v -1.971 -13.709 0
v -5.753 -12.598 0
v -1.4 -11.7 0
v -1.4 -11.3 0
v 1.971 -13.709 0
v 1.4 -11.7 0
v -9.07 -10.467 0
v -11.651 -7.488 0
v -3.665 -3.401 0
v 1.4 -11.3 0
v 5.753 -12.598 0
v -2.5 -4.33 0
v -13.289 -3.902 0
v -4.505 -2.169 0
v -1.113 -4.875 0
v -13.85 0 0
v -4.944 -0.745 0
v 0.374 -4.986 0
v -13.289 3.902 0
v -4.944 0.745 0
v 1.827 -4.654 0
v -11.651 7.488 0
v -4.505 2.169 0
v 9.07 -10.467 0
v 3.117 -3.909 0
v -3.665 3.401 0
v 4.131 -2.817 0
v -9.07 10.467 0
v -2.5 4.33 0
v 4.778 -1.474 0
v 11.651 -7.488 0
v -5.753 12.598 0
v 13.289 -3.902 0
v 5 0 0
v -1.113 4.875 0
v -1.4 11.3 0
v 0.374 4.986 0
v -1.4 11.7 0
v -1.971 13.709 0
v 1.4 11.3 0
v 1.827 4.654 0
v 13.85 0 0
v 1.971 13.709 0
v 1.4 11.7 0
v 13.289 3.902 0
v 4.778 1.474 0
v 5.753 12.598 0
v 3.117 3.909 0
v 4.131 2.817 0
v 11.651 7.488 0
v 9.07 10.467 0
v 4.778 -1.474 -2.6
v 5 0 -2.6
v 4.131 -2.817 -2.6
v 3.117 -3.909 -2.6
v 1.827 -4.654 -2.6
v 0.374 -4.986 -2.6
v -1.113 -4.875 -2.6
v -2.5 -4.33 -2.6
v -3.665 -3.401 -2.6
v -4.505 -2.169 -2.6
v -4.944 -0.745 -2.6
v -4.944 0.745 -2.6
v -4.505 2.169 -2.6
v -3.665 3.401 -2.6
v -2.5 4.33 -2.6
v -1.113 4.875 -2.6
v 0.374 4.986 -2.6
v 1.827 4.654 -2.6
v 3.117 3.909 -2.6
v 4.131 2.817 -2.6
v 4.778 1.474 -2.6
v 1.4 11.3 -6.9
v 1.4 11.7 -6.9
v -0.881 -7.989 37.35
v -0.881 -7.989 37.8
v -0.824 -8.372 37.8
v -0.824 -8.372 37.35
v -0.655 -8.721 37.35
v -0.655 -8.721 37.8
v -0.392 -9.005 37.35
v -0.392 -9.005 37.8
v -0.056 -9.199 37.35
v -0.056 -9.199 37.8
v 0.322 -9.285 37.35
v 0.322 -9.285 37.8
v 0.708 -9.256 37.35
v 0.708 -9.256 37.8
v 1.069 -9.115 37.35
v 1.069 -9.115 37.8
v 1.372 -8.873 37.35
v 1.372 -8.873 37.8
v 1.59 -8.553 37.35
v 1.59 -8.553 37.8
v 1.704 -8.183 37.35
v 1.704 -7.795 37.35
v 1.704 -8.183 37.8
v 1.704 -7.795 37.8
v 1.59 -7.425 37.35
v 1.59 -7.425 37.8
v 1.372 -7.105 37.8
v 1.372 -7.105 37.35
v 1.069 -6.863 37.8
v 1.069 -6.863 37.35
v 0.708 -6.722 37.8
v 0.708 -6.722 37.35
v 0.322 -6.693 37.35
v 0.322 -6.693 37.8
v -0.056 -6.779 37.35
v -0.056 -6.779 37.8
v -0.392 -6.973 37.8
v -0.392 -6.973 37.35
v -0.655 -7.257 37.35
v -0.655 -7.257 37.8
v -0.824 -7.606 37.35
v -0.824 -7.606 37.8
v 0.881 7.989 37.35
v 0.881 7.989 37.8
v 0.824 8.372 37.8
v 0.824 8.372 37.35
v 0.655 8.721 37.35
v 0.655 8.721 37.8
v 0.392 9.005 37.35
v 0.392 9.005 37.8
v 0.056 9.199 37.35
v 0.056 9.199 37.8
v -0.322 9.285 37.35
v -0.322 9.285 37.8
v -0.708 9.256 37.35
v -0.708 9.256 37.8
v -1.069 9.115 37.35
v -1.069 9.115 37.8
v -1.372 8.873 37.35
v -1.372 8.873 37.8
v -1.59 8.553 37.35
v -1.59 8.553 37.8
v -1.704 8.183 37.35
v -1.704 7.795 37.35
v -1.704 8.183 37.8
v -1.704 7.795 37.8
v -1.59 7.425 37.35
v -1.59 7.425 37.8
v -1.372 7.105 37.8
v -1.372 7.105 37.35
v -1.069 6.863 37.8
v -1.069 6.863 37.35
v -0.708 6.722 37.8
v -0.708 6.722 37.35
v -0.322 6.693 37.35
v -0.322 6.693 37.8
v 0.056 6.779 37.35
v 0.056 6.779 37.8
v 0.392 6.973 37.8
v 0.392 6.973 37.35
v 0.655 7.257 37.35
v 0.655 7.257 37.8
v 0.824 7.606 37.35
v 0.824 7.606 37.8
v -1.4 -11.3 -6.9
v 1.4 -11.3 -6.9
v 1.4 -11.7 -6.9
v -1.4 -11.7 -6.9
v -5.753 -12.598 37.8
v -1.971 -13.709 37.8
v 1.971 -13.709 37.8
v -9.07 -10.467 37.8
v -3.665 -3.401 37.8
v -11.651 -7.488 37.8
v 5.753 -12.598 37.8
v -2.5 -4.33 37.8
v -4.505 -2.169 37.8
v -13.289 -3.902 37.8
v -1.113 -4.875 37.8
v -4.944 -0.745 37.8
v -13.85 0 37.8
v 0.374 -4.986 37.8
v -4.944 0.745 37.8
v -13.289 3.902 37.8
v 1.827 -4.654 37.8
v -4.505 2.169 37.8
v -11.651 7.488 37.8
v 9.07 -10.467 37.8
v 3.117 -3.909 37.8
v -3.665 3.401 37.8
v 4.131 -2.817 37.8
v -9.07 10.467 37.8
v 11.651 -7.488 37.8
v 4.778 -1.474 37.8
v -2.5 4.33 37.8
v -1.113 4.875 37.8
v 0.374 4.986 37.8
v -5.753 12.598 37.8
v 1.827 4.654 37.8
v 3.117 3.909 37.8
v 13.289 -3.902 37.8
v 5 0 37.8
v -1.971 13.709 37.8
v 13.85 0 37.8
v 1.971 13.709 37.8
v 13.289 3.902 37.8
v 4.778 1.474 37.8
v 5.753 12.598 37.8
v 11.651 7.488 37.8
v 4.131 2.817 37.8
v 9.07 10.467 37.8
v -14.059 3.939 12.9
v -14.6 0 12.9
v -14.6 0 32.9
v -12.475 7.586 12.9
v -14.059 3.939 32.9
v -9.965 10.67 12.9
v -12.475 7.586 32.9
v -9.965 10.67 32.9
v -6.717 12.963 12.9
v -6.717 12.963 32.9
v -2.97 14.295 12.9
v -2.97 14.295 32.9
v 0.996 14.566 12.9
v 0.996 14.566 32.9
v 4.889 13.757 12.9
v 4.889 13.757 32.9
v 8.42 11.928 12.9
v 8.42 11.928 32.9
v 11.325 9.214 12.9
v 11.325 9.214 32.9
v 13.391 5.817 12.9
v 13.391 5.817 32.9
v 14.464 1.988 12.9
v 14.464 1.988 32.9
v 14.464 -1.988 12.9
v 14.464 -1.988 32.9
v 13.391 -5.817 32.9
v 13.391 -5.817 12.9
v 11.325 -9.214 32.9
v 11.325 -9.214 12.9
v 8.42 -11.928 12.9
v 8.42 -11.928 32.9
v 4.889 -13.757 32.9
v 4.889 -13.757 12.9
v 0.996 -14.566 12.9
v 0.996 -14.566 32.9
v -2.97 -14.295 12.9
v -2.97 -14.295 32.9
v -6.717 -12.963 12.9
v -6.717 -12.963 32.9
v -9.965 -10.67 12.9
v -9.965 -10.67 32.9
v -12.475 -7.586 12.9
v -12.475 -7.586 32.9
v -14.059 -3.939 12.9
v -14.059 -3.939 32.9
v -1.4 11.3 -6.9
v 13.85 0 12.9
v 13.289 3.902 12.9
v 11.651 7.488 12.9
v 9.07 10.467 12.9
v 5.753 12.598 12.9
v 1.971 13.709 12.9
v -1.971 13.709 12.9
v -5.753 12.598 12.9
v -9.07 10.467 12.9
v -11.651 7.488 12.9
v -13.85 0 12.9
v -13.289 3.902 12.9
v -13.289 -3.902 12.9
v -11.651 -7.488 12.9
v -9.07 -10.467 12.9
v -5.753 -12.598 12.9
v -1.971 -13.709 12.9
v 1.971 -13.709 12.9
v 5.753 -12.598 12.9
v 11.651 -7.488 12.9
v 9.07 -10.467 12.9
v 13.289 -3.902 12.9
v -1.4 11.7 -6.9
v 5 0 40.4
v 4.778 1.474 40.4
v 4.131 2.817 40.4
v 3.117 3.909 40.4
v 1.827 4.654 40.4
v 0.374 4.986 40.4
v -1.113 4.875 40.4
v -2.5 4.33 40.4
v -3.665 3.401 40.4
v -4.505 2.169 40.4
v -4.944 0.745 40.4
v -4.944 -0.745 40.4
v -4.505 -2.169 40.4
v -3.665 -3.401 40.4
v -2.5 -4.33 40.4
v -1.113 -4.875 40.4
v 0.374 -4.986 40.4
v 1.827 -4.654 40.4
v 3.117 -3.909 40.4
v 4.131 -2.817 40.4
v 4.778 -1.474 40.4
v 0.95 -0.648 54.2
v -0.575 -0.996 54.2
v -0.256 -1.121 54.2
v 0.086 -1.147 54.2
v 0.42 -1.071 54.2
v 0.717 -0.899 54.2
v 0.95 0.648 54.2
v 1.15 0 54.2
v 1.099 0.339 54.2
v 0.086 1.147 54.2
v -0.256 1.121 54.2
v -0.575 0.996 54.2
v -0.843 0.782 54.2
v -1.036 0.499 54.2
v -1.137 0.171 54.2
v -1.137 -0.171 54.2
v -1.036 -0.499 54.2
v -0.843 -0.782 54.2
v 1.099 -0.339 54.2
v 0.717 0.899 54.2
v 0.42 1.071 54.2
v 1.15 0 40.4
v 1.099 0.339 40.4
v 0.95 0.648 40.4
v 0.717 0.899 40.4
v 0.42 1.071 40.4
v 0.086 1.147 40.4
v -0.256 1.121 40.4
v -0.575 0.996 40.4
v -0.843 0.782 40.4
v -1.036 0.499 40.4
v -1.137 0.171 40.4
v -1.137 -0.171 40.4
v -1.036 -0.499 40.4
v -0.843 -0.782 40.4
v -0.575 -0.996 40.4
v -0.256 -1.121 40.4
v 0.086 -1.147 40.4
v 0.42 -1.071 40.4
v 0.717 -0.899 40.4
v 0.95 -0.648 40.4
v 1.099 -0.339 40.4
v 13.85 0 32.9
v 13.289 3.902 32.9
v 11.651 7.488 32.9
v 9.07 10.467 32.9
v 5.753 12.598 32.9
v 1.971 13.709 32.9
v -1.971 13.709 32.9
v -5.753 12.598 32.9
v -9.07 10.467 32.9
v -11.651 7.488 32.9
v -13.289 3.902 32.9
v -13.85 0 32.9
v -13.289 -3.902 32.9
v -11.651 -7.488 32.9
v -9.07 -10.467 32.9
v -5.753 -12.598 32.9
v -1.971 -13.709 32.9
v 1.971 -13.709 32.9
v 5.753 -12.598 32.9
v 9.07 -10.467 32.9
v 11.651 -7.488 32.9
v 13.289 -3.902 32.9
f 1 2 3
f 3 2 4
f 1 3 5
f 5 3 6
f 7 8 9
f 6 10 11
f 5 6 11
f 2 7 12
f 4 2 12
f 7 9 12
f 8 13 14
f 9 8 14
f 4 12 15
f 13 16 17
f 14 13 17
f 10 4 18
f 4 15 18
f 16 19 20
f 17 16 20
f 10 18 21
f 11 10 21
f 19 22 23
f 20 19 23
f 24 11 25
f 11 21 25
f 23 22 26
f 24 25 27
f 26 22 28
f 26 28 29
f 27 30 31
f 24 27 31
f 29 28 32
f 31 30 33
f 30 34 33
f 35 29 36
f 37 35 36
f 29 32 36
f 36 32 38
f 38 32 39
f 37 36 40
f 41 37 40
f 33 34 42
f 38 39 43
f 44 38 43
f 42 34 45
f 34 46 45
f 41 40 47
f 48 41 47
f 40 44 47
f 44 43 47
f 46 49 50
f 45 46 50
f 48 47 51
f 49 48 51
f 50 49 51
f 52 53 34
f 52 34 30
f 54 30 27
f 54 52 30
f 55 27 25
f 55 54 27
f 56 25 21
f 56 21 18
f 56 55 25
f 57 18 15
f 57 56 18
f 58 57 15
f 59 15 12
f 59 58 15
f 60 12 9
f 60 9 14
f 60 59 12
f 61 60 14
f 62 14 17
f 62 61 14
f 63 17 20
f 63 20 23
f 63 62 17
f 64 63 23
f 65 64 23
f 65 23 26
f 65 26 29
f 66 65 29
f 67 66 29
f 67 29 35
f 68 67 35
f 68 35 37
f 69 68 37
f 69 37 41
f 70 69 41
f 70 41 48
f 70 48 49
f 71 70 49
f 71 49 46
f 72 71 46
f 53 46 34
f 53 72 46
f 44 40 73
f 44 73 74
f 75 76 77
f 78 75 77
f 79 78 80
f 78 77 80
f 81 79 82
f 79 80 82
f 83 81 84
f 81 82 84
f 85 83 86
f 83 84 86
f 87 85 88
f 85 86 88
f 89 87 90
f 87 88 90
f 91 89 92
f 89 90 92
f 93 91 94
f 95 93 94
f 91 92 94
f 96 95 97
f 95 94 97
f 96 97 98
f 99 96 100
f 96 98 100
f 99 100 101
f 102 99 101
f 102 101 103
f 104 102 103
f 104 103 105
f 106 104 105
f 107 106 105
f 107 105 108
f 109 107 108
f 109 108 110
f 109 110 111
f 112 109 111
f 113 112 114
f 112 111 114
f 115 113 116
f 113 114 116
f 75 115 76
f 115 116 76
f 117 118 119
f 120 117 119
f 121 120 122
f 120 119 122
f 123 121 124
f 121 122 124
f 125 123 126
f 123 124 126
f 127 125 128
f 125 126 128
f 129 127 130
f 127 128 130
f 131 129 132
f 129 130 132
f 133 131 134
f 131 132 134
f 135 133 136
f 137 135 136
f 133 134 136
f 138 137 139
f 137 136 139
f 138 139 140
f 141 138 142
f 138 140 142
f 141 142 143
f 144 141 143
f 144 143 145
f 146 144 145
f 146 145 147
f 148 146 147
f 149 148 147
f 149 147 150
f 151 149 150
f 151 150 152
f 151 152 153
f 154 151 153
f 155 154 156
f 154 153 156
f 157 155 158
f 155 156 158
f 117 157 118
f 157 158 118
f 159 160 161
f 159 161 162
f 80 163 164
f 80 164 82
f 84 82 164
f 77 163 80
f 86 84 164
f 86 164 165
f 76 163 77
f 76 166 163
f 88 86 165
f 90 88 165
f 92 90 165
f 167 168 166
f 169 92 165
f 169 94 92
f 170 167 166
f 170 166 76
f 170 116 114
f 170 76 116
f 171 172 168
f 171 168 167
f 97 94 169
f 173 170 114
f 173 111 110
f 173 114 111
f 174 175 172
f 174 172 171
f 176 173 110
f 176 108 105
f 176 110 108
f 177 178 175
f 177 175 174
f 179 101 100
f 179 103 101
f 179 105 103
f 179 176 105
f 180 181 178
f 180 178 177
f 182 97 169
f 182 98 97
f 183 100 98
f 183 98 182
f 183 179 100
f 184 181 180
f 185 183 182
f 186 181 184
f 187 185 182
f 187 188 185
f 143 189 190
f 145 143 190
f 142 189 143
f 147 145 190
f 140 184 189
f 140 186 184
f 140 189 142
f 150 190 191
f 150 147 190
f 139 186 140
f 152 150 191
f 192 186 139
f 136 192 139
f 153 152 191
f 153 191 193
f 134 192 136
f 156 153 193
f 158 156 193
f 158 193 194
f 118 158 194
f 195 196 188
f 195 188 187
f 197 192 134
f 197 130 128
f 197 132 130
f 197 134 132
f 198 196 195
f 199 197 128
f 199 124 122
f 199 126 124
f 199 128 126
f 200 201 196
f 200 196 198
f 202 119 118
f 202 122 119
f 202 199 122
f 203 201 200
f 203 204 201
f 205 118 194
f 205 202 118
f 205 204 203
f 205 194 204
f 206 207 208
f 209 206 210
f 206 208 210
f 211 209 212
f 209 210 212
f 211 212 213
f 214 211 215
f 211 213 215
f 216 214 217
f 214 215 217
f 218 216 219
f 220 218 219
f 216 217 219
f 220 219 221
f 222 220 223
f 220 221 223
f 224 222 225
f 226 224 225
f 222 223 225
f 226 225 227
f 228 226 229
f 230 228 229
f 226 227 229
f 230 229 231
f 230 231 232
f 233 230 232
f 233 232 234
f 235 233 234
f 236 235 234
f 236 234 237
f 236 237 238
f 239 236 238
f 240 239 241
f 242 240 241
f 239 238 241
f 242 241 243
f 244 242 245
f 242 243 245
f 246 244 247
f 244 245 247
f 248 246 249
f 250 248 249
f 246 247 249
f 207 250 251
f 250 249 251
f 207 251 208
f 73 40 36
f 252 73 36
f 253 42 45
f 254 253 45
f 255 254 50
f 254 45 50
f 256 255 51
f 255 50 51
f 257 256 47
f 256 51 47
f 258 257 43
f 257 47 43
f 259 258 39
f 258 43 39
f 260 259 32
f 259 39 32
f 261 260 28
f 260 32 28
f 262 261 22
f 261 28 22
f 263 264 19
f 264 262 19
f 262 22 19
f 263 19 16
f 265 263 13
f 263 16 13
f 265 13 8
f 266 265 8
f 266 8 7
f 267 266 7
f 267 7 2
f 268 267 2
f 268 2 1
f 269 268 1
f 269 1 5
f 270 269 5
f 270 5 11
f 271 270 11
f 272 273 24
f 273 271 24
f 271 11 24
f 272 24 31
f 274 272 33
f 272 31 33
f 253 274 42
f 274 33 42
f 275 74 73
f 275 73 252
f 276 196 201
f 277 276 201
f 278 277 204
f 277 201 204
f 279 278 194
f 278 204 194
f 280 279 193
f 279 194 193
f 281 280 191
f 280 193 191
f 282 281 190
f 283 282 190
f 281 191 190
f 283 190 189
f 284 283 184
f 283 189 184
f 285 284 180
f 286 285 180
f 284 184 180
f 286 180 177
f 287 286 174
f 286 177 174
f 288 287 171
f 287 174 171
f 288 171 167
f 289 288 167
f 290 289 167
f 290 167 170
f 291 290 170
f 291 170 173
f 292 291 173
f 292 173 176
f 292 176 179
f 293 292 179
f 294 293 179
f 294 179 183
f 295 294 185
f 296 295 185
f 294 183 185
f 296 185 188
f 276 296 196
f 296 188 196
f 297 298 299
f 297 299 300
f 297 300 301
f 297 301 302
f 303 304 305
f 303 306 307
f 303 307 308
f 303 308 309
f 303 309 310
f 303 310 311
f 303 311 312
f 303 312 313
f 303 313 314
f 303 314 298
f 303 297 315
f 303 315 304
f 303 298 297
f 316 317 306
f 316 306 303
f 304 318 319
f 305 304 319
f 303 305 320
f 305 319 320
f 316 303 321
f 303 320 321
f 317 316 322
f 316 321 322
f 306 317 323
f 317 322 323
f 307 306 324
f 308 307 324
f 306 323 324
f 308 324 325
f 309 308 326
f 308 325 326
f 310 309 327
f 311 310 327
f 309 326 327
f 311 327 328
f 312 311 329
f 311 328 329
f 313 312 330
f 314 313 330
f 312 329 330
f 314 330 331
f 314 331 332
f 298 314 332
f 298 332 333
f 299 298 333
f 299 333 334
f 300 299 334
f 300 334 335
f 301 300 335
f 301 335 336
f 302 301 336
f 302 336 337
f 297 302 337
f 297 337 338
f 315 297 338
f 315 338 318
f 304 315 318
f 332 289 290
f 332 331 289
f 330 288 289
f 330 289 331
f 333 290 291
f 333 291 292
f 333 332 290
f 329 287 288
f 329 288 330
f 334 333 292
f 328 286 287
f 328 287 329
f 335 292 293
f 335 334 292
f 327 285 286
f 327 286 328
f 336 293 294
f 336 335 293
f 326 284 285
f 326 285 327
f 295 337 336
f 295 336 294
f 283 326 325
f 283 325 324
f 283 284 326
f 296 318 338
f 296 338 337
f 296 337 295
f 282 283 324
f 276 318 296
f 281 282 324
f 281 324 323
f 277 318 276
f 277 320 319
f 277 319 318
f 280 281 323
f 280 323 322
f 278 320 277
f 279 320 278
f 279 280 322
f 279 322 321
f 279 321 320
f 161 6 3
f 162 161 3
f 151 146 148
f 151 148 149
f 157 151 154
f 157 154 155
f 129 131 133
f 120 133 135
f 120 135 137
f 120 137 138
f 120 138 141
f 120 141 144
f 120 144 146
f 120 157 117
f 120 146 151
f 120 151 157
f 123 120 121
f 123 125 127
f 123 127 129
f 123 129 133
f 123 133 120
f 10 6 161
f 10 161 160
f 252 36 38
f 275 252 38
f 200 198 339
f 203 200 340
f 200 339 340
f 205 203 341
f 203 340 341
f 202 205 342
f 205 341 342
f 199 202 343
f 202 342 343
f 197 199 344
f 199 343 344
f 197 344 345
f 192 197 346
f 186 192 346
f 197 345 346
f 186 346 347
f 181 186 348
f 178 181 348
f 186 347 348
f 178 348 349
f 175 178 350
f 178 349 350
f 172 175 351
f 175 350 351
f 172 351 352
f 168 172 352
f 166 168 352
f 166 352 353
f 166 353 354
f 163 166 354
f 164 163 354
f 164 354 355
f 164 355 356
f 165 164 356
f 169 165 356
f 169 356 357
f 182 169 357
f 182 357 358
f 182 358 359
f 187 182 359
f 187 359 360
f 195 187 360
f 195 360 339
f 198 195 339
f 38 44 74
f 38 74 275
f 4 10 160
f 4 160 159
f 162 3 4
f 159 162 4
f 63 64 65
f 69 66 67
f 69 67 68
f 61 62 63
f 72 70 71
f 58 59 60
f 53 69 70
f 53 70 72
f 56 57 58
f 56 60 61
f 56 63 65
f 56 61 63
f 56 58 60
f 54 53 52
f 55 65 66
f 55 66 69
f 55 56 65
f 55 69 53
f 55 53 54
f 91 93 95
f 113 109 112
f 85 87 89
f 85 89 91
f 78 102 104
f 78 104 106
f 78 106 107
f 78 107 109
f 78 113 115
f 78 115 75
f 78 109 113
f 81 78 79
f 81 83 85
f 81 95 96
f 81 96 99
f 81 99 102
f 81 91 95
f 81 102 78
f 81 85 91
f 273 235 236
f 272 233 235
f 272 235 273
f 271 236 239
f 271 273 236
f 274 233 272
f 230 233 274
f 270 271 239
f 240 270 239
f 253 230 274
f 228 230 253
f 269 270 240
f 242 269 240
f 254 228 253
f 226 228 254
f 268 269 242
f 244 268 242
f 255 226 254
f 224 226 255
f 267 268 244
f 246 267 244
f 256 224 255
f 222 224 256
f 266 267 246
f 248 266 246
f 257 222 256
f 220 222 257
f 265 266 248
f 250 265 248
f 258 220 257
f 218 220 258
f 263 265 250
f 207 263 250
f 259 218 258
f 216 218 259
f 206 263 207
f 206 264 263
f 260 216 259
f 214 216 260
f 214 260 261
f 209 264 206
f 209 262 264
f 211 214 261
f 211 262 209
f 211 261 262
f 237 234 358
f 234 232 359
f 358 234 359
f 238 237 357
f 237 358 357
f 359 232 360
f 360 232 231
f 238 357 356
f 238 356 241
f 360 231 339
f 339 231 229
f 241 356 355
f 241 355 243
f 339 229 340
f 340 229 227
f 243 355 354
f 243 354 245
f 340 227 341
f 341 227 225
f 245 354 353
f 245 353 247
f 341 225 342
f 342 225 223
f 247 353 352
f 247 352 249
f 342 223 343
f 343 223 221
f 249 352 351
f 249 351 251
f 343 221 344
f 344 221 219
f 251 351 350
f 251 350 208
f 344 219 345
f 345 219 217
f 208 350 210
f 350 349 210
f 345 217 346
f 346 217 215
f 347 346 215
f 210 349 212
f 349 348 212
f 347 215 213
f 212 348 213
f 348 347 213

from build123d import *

# Parameters (mm, degrees)
SKETCH_1_R          = 13.85
EXTRUDE_1_DEPTH     = 37.8
SKETCH_2_R          = 5
EXTRUDE_2_DEPTH     = 2.6
EXTRUDE_START       = -2.6
SKETCH_3_R          = 1.15
EXTRUDE_3_DEPTH     = 16.4
EXTRUDE_START_2     = -32.9
SKETCH_4_R          = 14.6
EXTRUDE_4_DEPTH     = 20
EXTRUDE_START_3     = 2.6
SKETCH_5_R          = 5
EXTRUDE_5_DEPTH     = 2.6
SKETCH_6_W          = 2.8
SKETCH_6_H          = 0.4
EXTRUDE_6_DEPTH     = 6.9
SKETCH_7_R          = 1.3
CUT_EXTRUDE_1_DEPTH = 0.45


with BuildPart() as part:
    # ｽｹｯﾁ1 → ﾎﾞｽ - 押し出し1 (new body)
    with BuildSketch(Plane.XY):
        Circle(SKETCH_1_R)
    extrude(amount=EXTRUDE_1_DEPTH)

    # ｽｹｯﾁ2 → ﾎﾞｽ - 押し出し2 (add)
    with BuildSketch(Plane.XY.offset(37.8)):
        Circle(SKETCH_2_R)
    extrude(amount=EXTRUDE_2_DEPTH)

    # ｽｹｯﾁ3 → ﾎﾞｽ - 押し出し3 (add)
    with BuildSketch(Plane.XY.offset(40.4).offset(EXTRUDE_START)):
        Circle(SKETCH_3_R)
    extrude(amount=EXTRUDE_3_DEPTH)

    # ｽｹｯﾁ4 → ﾎﾞｽ - 押し出し4 (add)
    with BuildSketch(Plane(origin=(0, 0, 0), x_dir=(-1, 0, 0), z_dir=(0, 0, -1)).offset(EXTRUDE_START_2)):
        Circle(SKETCH_4_R)
    extrude(amount=EXTRUDE_4_DEPTH)

    # ｽｹｯﾁ5 → ﾎﾞｽ - 押し出し5 (add)
    with BuildSketch(Plane(origin=(0, 0, 0), x_dir=(-1, 0, 0), z_dir=(0, 0, -1)).offset(EXTRUDE_START_3)):
        with Locations(Location((0, 0, 0), (0, 0, 180))):
            Circle(SKETCH_5_R)
    extrude(amount=-EXTRUDE_5_DEPTH)

    # ｽｹｯﾁ6 → ﾎﾞｽ - 押し出し6 (add)
    with BuildSketch(Plane(origin=(0, 0, 0), x_dir=(-1, 0, 0), z_dir=(0, 0, -1))):
        with Locations((0, 11.5)):
            Rectangle(SKETCH_6_W, SKETCH_6_H)
        with Locations((0, -11.5)):
            Rectangle(SKETCH_6_W, SKETCH_6_H)
    extrude(amount=EXTRUDE_6_DEPTH)

    # ｽｹｯﾁ7 → ｶｯﾄ - 押し出し1 (cut)
    with BuildSketch(Plane.XY.offset(37.8)):
        with Locations((-0.41868765, 7.989036278)):
            Circle(SKETCH_7_R)
        with Locations(Location((0.41868765, -7.989036278, 0), (0, 0, 180))):
            Circle(SKETCH_7_R)
    extrude(amount=-CUT_EXTRUDE_1_DEPTH, mode=Mode.SUBTRACT)


solid = part.part
